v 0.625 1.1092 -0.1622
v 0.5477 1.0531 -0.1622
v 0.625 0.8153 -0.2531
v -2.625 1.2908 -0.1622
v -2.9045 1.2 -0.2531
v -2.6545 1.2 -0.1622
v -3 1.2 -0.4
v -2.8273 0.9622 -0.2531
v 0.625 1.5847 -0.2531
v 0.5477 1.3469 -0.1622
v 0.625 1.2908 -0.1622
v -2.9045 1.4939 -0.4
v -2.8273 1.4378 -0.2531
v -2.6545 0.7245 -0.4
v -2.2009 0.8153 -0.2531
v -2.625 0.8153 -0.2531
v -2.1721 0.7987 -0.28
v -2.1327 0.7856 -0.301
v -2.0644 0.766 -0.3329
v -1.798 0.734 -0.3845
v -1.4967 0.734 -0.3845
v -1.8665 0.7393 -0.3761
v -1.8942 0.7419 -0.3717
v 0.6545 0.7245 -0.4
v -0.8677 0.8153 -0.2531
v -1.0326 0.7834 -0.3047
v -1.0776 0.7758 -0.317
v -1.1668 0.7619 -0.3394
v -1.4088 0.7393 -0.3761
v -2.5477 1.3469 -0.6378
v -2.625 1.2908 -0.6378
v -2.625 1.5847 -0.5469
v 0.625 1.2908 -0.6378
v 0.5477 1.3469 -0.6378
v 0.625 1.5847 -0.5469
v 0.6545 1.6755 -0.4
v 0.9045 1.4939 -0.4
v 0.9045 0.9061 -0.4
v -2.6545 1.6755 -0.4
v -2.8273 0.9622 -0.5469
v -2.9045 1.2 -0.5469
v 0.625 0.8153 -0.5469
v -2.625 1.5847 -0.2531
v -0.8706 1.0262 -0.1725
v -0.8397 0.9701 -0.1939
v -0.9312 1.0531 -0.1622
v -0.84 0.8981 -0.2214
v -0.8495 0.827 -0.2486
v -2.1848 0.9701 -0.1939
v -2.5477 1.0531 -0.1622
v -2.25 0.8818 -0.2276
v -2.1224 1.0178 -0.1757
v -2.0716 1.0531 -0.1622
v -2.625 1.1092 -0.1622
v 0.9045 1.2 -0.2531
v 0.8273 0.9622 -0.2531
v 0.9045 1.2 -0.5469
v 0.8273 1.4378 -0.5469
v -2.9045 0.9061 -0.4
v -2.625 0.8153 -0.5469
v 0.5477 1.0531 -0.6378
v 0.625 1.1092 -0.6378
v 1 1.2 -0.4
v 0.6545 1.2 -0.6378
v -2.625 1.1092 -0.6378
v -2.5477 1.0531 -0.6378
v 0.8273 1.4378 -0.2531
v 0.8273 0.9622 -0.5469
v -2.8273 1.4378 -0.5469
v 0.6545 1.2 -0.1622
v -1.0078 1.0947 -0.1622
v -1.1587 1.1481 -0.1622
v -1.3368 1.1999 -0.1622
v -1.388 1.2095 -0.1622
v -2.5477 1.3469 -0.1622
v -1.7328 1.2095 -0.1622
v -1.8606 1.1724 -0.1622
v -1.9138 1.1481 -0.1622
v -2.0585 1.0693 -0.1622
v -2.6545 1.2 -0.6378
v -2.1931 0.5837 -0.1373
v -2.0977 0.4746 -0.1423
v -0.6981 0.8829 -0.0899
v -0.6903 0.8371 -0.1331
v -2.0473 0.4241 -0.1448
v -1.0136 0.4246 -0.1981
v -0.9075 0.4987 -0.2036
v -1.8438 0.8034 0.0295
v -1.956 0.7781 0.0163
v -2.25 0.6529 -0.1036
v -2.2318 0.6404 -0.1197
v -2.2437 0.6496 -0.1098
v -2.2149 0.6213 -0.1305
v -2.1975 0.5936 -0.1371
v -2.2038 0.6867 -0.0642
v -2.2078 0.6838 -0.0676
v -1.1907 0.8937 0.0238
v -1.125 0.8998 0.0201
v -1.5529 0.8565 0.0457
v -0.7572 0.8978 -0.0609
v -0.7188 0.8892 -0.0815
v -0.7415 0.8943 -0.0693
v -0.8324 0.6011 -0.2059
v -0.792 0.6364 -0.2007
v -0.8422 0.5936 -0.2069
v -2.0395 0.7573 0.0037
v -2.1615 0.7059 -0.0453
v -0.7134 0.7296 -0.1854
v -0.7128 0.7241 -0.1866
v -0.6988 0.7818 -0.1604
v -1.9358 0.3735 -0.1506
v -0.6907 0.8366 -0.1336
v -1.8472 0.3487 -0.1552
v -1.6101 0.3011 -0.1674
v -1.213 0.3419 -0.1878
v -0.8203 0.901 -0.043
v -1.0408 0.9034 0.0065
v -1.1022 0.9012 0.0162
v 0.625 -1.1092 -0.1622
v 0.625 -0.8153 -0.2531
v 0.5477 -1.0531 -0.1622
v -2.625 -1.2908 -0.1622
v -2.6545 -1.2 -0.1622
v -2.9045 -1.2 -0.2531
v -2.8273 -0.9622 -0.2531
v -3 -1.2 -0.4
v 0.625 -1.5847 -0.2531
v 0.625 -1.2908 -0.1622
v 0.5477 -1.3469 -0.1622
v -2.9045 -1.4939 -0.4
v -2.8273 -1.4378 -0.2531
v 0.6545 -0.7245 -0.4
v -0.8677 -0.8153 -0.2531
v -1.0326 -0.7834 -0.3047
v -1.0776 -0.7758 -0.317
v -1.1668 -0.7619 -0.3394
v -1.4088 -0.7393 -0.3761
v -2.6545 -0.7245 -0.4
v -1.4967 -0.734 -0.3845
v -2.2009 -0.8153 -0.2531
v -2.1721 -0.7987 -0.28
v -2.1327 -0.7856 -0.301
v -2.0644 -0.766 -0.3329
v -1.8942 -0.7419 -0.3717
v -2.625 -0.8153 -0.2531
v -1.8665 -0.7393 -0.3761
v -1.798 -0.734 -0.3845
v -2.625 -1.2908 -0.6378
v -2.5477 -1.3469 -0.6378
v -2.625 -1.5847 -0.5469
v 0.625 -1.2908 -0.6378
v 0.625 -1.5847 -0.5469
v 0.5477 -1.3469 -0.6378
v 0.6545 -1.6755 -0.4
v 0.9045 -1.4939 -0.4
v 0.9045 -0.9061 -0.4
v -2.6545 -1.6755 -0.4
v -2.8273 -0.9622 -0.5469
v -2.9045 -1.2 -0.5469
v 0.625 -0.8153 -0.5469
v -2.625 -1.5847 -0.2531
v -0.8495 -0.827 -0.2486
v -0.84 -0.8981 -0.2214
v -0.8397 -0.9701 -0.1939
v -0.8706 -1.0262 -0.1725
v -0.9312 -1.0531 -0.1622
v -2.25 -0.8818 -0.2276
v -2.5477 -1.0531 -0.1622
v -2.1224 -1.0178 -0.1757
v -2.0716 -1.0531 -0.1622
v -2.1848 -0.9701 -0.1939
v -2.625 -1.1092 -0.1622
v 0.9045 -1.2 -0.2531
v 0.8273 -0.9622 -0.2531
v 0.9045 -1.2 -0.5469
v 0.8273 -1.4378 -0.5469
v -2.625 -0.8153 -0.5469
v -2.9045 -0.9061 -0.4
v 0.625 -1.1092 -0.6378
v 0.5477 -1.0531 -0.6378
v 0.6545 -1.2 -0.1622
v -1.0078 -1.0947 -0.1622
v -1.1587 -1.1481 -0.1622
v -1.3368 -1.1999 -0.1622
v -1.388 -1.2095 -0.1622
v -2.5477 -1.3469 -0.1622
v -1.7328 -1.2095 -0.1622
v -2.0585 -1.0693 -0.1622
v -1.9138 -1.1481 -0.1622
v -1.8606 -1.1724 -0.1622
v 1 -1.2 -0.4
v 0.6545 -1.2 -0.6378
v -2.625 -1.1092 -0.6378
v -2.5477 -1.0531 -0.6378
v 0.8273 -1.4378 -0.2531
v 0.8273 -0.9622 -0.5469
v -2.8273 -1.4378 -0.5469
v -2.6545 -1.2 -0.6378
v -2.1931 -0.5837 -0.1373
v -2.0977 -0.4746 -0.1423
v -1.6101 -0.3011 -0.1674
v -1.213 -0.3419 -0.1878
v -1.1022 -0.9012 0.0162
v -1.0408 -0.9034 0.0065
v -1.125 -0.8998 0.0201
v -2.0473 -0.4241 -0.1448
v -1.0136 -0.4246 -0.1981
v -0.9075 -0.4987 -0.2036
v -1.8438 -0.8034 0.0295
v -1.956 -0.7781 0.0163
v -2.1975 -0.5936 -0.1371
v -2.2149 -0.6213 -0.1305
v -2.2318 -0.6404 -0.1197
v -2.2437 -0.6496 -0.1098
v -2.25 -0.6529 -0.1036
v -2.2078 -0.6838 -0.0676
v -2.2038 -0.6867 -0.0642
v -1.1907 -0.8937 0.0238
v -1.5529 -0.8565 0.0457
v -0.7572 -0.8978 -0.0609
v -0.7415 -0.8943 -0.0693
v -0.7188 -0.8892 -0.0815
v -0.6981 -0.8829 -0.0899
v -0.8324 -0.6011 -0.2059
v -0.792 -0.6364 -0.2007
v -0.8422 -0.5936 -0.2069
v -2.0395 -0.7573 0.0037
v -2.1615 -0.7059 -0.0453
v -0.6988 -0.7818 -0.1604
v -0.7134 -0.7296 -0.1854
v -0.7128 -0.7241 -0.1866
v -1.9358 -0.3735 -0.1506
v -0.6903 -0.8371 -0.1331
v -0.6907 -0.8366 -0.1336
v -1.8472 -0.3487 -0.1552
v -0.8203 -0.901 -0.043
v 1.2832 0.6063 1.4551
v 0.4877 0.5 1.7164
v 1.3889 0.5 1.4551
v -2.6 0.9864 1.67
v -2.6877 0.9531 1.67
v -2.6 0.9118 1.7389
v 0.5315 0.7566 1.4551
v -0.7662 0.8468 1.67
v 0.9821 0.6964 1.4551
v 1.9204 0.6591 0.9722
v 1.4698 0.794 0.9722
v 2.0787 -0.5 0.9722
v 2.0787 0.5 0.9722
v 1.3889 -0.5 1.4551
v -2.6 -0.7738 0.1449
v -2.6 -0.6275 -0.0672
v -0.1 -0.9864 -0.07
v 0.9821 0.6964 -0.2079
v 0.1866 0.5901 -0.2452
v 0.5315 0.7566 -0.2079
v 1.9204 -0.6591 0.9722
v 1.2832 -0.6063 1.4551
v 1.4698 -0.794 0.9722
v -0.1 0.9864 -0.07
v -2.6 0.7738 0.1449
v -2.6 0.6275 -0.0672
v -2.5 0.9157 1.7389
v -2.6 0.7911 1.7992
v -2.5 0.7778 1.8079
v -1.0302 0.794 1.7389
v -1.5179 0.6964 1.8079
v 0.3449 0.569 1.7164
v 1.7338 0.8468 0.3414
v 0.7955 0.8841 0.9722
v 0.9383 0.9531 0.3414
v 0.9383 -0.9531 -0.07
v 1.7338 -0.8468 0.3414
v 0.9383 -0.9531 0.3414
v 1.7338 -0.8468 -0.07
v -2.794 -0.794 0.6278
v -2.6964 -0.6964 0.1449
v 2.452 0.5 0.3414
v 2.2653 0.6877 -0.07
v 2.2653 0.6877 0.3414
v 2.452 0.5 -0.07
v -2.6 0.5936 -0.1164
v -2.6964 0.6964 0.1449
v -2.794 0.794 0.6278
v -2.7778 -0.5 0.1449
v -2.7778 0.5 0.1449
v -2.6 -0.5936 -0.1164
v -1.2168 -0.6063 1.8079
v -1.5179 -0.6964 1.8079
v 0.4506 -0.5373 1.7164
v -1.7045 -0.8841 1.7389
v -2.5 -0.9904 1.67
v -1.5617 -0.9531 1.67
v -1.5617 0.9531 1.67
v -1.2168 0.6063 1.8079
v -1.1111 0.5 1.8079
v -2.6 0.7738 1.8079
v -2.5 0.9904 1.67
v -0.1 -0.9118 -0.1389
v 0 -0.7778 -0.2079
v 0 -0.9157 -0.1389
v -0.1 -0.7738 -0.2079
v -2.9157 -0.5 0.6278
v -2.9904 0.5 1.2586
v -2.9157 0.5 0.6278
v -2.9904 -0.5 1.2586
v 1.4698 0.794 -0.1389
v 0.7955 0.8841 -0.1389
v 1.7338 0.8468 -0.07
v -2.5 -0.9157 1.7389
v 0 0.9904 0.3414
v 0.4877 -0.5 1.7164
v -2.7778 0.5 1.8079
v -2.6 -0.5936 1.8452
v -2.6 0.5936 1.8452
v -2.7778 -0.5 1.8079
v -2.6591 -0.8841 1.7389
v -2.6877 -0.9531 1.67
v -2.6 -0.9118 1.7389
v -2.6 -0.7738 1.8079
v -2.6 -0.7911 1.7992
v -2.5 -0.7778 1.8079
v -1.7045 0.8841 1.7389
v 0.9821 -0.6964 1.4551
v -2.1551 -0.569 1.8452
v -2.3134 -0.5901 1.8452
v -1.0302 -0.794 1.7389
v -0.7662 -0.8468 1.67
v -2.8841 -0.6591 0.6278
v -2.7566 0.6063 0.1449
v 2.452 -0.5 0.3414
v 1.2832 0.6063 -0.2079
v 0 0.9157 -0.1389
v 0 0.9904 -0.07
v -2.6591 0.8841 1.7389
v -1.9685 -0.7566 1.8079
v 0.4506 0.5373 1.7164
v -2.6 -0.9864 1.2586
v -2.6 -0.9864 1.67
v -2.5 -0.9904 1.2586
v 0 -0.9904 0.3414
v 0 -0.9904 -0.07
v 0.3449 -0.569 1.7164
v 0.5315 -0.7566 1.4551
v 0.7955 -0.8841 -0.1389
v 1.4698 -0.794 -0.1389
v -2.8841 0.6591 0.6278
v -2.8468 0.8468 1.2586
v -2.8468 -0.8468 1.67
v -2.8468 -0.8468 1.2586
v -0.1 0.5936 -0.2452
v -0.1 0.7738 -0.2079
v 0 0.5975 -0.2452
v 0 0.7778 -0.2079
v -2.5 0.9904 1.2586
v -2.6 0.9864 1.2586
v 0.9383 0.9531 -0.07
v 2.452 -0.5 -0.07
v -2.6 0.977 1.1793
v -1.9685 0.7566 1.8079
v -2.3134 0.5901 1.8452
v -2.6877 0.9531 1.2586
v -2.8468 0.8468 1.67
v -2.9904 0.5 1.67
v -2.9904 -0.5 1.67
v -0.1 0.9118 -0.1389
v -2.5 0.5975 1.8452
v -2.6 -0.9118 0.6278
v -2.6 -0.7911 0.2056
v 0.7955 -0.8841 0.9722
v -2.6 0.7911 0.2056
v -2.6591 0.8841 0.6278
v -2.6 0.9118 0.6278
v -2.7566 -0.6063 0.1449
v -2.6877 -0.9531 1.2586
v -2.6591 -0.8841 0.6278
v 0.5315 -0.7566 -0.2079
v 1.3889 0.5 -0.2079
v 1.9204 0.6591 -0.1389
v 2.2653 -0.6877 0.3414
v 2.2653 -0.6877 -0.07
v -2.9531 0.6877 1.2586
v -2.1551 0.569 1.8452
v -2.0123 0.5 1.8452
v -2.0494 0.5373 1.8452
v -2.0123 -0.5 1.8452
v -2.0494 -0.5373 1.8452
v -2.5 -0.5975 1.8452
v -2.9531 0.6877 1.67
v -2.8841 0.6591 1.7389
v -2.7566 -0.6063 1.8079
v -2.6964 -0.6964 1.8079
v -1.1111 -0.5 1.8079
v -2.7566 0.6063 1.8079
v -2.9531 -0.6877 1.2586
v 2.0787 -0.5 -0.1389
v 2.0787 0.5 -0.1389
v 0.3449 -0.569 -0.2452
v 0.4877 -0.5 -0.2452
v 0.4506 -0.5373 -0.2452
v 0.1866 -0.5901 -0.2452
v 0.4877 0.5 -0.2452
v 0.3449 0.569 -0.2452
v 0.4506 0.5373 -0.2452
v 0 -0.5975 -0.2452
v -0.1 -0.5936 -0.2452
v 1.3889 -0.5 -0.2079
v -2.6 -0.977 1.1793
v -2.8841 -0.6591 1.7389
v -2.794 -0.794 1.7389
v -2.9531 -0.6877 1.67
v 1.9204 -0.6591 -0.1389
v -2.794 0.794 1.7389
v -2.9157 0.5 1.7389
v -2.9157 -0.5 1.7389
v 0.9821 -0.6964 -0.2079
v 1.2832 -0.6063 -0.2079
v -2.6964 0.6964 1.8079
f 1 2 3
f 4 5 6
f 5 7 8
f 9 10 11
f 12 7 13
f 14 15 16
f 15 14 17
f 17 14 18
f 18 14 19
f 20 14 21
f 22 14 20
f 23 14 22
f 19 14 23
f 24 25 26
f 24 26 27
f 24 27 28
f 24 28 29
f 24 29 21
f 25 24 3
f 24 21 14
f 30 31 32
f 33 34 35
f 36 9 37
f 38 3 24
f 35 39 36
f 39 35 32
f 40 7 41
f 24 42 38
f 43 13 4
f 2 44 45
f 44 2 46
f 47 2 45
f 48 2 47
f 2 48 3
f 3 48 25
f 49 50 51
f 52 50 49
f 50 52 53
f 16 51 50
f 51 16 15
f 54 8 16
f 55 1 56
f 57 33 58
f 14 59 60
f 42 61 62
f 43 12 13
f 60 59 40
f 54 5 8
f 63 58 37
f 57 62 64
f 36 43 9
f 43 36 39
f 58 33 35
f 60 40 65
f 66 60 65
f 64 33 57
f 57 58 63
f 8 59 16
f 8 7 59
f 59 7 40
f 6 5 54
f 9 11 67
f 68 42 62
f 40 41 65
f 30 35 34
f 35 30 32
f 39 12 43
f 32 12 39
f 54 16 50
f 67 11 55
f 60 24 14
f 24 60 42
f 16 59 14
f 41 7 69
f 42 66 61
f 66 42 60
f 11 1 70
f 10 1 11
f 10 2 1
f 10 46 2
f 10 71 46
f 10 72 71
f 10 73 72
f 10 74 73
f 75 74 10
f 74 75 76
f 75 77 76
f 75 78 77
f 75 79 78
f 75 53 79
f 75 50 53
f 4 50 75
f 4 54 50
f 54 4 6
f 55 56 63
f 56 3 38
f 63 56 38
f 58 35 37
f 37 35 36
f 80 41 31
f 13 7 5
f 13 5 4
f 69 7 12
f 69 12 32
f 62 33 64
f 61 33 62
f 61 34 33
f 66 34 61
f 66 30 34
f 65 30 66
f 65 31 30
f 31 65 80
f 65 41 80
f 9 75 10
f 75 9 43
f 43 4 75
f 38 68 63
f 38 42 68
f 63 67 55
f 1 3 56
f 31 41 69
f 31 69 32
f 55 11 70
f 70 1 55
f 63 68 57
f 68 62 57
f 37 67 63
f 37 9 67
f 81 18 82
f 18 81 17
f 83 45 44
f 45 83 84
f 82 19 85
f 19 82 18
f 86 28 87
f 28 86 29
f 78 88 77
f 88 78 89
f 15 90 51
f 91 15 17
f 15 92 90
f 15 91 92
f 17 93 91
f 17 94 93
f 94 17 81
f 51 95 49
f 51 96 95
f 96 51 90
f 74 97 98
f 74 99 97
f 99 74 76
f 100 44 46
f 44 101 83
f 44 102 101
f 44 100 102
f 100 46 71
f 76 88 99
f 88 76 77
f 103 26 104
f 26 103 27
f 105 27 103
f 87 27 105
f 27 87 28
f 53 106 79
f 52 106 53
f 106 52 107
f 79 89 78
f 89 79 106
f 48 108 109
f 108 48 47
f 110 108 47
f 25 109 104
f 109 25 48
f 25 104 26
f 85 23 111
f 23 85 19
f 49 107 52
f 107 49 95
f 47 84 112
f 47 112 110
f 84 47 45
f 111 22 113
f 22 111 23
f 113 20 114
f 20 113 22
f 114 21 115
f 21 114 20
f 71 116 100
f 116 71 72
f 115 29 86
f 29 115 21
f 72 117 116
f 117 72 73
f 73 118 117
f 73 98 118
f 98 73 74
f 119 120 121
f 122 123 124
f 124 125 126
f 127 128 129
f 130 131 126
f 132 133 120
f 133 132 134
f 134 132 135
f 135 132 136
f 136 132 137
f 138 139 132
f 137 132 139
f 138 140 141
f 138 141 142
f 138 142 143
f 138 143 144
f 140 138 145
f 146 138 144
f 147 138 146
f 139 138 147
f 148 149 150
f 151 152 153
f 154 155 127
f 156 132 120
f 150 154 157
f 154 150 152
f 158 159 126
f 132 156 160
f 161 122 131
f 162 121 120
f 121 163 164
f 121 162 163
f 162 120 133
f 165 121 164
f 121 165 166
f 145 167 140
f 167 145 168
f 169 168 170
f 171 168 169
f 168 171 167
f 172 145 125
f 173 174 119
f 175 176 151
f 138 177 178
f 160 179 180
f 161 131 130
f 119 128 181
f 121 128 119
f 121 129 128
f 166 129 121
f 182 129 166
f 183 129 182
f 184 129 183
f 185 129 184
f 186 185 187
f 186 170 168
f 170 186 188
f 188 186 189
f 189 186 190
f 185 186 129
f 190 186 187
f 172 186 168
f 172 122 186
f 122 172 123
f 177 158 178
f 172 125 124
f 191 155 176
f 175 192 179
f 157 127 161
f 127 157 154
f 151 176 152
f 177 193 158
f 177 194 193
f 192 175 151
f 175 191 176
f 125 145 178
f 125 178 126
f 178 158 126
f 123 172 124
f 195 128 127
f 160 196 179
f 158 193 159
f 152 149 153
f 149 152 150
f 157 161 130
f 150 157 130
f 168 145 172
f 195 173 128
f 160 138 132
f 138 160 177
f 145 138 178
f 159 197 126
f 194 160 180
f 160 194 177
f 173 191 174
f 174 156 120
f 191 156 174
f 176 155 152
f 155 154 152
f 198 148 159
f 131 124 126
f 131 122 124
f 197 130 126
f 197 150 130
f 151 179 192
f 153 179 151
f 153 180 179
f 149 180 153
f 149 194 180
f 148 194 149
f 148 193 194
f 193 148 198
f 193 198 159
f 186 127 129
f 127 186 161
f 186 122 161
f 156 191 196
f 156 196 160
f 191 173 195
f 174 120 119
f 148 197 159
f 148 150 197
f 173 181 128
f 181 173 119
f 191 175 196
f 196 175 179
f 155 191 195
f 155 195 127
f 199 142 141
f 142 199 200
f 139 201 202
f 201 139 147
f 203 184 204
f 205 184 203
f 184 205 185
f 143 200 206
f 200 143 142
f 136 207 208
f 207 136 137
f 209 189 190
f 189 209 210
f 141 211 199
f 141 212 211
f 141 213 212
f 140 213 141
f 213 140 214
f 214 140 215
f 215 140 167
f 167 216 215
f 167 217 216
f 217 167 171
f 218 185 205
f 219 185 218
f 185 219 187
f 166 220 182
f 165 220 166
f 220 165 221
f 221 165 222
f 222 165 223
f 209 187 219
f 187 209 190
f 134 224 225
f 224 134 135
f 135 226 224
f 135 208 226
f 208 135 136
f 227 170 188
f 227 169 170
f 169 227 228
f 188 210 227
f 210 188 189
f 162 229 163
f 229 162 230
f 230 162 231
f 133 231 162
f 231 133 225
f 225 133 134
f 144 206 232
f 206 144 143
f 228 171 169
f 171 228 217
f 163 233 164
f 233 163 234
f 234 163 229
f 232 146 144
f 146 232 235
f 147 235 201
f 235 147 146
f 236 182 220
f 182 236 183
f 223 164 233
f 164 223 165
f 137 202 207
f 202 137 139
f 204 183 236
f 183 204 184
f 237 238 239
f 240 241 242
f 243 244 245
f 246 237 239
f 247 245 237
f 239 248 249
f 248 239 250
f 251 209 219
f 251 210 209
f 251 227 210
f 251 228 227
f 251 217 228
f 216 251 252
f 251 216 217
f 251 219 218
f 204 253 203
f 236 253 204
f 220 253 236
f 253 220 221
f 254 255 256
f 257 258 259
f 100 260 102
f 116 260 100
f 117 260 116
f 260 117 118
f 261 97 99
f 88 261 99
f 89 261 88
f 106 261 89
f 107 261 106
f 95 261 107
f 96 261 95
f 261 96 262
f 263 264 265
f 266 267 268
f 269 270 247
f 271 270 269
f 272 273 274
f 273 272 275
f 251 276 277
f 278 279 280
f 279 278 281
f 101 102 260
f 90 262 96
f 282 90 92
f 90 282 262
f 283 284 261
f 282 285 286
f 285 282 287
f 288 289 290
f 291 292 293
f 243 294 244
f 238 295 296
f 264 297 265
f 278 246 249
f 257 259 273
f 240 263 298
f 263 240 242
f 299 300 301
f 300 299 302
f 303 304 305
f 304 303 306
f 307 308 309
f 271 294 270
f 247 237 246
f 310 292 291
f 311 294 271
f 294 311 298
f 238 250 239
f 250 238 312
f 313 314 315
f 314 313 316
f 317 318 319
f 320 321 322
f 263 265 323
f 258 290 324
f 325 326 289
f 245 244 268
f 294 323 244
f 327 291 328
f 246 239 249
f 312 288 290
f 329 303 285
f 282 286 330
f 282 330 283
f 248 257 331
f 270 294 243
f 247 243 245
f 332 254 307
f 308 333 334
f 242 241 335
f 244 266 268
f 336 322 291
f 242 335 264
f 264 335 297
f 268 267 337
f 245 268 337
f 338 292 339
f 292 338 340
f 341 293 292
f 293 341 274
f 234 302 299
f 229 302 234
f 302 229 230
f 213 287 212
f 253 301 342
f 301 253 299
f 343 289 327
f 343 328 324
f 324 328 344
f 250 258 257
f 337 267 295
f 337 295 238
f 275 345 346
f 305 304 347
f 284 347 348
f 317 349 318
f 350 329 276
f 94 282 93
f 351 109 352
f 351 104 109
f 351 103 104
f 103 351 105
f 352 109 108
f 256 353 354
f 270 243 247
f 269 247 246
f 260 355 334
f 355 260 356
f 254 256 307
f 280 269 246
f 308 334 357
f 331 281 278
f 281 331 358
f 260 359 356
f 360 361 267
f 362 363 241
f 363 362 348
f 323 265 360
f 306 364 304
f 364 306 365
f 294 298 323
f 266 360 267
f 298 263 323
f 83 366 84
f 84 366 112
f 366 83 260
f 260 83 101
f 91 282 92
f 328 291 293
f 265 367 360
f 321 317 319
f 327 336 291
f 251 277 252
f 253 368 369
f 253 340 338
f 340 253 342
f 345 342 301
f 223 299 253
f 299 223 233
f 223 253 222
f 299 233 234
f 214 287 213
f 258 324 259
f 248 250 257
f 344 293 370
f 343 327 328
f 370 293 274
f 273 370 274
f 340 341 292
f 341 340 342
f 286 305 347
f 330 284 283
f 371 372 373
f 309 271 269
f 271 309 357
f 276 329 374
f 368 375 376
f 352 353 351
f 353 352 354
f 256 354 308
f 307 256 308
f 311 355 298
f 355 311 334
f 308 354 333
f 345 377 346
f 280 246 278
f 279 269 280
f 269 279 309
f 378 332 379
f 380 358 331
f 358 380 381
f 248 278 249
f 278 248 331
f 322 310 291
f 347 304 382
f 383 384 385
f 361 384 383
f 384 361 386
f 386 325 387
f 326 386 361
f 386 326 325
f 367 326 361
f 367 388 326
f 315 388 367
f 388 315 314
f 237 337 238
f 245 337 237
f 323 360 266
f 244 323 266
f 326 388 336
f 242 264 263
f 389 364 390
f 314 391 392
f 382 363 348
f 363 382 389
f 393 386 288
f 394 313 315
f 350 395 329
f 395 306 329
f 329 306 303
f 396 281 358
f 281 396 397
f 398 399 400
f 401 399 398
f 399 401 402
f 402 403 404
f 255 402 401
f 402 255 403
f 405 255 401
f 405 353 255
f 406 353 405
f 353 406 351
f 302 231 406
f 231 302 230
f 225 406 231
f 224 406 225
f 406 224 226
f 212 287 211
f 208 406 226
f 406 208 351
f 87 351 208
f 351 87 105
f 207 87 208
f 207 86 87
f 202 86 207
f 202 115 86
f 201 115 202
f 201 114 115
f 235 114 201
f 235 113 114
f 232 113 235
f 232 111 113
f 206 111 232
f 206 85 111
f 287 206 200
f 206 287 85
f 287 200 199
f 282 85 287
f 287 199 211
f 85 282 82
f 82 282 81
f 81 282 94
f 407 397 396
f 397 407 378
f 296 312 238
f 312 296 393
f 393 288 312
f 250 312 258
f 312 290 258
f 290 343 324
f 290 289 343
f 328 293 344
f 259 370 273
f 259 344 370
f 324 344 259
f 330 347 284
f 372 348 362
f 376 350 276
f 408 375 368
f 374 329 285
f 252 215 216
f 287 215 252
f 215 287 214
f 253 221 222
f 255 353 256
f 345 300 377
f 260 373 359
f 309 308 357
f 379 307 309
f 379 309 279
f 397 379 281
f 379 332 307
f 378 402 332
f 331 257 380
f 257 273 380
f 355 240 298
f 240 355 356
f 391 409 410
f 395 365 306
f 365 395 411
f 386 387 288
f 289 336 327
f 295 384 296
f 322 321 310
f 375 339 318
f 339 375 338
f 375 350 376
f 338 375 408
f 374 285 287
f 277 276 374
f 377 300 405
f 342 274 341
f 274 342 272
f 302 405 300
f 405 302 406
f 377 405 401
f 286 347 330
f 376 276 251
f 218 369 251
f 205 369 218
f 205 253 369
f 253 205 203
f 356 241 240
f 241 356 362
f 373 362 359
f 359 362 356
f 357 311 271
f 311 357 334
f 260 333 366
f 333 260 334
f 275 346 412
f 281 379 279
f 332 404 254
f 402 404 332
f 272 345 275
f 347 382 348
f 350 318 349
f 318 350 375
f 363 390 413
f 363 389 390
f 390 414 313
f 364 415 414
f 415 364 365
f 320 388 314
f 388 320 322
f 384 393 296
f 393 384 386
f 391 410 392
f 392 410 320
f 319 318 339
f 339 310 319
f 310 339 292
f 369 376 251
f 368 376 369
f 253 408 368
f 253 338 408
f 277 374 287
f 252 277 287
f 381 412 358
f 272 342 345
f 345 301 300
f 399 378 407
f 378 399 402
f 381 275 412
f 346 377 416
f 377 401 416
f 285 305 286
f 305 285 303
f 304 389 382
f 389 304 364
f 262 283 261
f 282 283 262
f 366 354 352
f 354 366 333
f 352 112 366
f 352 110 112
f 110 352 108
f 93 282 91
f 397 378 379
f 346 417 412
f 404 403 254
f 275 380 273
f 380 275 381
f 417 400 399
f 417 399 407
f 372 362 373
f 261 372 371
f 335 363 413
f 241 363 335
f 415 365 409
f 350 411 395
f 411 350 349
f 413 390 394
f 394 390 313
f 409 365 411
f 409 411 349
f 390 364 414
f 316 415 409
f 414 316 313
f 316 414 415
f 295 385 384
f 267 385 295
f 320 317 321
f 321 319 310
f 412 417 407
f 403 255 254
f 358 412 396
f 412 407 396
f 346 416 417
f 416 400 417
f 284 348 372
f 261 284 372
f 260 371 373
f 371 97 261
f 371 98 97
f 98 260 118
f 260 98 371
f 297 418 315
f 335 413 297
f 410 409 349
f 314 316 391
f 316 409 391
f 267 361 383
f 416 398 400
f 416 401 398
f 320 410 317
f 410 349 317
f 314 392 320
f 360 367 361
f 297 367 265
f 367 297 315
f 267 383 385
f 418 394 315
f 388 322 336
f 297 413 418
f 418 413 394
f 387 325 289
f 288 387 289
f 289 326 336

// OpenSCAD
// file: ../lib/util.scad
fn1 = 32;
fn2 = 16;

module util_half_sphere(radius, fn=fn1) {
    difference() {
        sphere(radius, $fn=fn);
        translate([0,0,-(radius+radius/19)])
            cube(2*radius+radius/10, center=true);
    }
}

function gcd(a,b) = a == b ? a : a > b ? gcd(a-b, b) : gcd(a, b-a);

module util_saucer(length, width, height, fn=fn1) {
    rad = gcd(length,gcd(width,height));
    //rad = 10;
    scale([length/(2*rad), width/(2*rad), height/rad])
        util_half_sphere(rad, fn);
}

module util_half_cylinder(length, radius, inner_fn=fn2, outer_fn=fn1) {
    maxval = max(length, 2*radius);
    intersection() {
        difference() {
            rotate([0,90,0])
                translate([0,0,-(length/2 + length/20)])
                    cylinder(length+length/10, radius, radius, $fn=inner_fn);
            
            translate([0,0,(maxval/2 + maxval/19)])
                cube(maxval+maxval/10, center=true);
        }
        
        translate([0,0,-(radius+radius/20)])
            cylinder(radius + radius/10, length/2, length/2, $fn=outer_fn);
    }
}

module util_body(length, width, height, upper_height, fn=fn1) {
    rad = gcd(length, gcd(width, upper_height));
    
    scale(.995) scale([length/(2*rad), width/(2*rad), 1])
        util_half_cylinder(2*rad, height, outer_fn=fn);
}

module util_graded_cylinder(height, radius_start, radius_end, grades=1, fn=fn1) {
    height_grade = height / grades;
    radius_grade = (radius_start - radius_end) / (grades * grades);
    for (i = [0 : 1 : grades]) {
        translate([0,0,i*height_grade])
            cylinder(height_grade, 
                     radius_start - i*radius_grade * i,
                     radius_start - (i+1) * radius_grade * (i+1),
                     $fn = fn);
    }
}

module util_nacelle(length, width, height, curved=false, up=true, front_bulge=false) {
    rad = min(width, height/2);
    grads = curved ? 6 : 1;
    scale_factor = front_bulge ? 1.1 : 1;
    direction = up ? -1 : 1;
    difference() {
        scale([1, width/ (2*rad), height/rad])
            difference() {
                union() {
                    rotate([0,-90,0])
                        rotate(30)
                            util_graded_cylinder(length-rad, rad, rad/2, grads, 6);
                    scale(scale_factor) 
                        rotate([0,90,0]) rotate(90) sphere(rad, $fn=6);
                }
                
                translate([-length/2, 0, direction * (height/2 + height/19)])
                    cube([length+length, width+width, height+height/10], center=true);
            }
        
        translate([-length-(curved?length/3:0), 0, -length/3])
            rotate([0,-45,0])
                cube(length, center=true);
    }
}

module util_mirrored(v) {
    children();
    mirror(v) children();
}

module util_ring(outer, inner, height, fn=fn1) {
    difference() {
        translate([0,0,-height/2])
            cylinder(height, outer, outer, $fn=fn);
        translate([0,0,-(height/2 + height/19)])
            cylinder(height+height/10, inner, inner, $fn=fn);
    }
}

module util_star(radius, thick, num, half=false) {
    angle = 360/num;
    offset = half? angle/2 : 0;
    for (i = [0: 1: num]) {
        rotate(i* angle + offset)
            translate([radius/2,0,0])
                cube([radius, thick, thick], center=true);
    }
}

module util_ring_star(radius, thick, num, inner, half=false) {
    outer=inner+thick;
    avg = (inner + outer)/2;
    union() {
        difference() {
            util_star(radius, thick, num, half);
            cylinder(2*thick, outer, outer, $fn=num, center=true);
        }
        util_ring(outer, inner, thick);
    }
}

module util_hangar_disk(height, lower, upper, num, fn=fn1) {
    difference() {
            cylinder(height, lower, upper, $fn=fn, center=true);
        difference() {
            scale([1,1,22])
                util_star(1.1*upper, height/20, num, half=true);
            scale(.95)
                cylinder(height, lower, upper, $fn=fn, center=true);
        }
    }
}

module util_hangar_form(length, width, height, num, inner=0) {
    l = 0.6* max(length, width);
    h = 2.5* height;
    thick = min(height/20,1);
    inner = inner == 0 ? l/3 : inner;
    difference() {
        children();
        scale([1,1,h/thick]) 
            util_ring_star(l, thick, num, inner, half=true);
    }
    scale(.95) children();
}

module util_nacelle_bar(span, height, width, thickness, faces=fn1) {
    rad = (span*span/(8*height) + height/2);
    outer = rad + thickness/2;
    inner = rad - thickness/2;
    difference(){
        translate([0,0,outer])
            rotate([0,90,0])
                util_ring(outer, inner, width, fn=faces);
    
        translate([0,0,1.1*outer+height])
            cube(2.2*outer, center=true);
    }
}

module util_q_sphere(rad, quadrant, faces) {
    x_sign = quadrant == 1 ? 1 :
             quadrant == 2 ? -1 :
             quadrant == 3 ? -1 :
             quadrant == 4 ? 1 : 0;
    z_sign = quadrant == 1 ? 1 :
             quadrant == 2 ? 1 :
             quadrant == 3 ? -1 :
             quadrant == 4 ? -1 : 0;
    
    difference() {
        sphere(rad, $fn=faces);

        translate([x_sign*(-1.1*rad - .01),0,0])
        cube(2.2*rad, center=true);

        translate([0,0,z_sign*(-1.1*rad - .01)])
        cube(2.2*rad, center=true);
    }
}

module util_ovoid(front_rad, back_rad, width, upper_rad, lower_rad, faces=32) {
    half_width = width/2;
    largest=max(front_rad, back_rad, half_width, upper_rad, lower_rad);
    smallest=min(front_rad, back_rad, half_width, upper_rad, lower_rad);
    
    union() {
        scale([front_rad/smallest, half_width/smallest, upper_rad/smallest])
        util_q_sphere(smallest, 1, faces);
        
        scale([front_rad/smallest, half_width/smallest, lower_rad/smallest])
        util_q_sphere(smallest, 4, faces);
        
        scale([back_rad/smallest, half_width/smallest, lower_rad/smallest])
        util_q_sphere(smallest, 3, faces);
        
        scale([back_rad/smallest, half_width/smallest, upper_rad/smallest])
        util_q_sphere(smallest, 2, faces);
    }
}

module util_saucer_shape(width, height, height_ext, depth, depth_ext) {
    difference() {
        util_ovoid(width/2,
                   width/2,
                   width,
                   height+height_ext,
                   depth+depth_ext);
        
        if (height_ext > 0) {
            translate([0,0,width/2 + height])
            cube(width, center=true);
        }
        
        if (depth_ext > 0) {
            translate([0,0,-width/2 - depth])
            cube(width, center=true);
        }
    }
}
// main file
use <../lib/util.scad>;

module small_shuttle_base() {
    util_ovoid(2.5, .5, 1, 1.75, .25, faces=16);
}

module small_shuttle_body() {
    hull() {
        util_mirrored([0,1,0])
        translate([0,1-.5,0])
        small_shuttle_base();

        util_mirrored([0,1,0])
        translate([-2.5,1-.5,1.6])
        mirror([0,0,1])
        small_shuttle_base();
    }
}

module small_shuttle_nacelle() {
    hull()
    util_mirrored([1,0,0])
    translate([1.5,0,0])
    scale([1,1,.5])
    sphere(d=1,$fn=10);
}

module small_shuttle() {
    small_shuttle_body();
    small_shuttle_assembly();
}

module small_shuttle_assembly() {
    util_mirrored([0,1,0]) {
        translate([-1,1.2,-.4]) 
        small_shuttle_nacelle();

        hull() {
            translate([-1,0,.25])
            scale([2.5,1,.25])
            sphere(.5, $fn=10);

            translate([-1.75,1.2,-.4]) 
            scale([1,.75,.25])
            sphere(.5, $fn=10);
        }
    }
}

small_shuttle();
